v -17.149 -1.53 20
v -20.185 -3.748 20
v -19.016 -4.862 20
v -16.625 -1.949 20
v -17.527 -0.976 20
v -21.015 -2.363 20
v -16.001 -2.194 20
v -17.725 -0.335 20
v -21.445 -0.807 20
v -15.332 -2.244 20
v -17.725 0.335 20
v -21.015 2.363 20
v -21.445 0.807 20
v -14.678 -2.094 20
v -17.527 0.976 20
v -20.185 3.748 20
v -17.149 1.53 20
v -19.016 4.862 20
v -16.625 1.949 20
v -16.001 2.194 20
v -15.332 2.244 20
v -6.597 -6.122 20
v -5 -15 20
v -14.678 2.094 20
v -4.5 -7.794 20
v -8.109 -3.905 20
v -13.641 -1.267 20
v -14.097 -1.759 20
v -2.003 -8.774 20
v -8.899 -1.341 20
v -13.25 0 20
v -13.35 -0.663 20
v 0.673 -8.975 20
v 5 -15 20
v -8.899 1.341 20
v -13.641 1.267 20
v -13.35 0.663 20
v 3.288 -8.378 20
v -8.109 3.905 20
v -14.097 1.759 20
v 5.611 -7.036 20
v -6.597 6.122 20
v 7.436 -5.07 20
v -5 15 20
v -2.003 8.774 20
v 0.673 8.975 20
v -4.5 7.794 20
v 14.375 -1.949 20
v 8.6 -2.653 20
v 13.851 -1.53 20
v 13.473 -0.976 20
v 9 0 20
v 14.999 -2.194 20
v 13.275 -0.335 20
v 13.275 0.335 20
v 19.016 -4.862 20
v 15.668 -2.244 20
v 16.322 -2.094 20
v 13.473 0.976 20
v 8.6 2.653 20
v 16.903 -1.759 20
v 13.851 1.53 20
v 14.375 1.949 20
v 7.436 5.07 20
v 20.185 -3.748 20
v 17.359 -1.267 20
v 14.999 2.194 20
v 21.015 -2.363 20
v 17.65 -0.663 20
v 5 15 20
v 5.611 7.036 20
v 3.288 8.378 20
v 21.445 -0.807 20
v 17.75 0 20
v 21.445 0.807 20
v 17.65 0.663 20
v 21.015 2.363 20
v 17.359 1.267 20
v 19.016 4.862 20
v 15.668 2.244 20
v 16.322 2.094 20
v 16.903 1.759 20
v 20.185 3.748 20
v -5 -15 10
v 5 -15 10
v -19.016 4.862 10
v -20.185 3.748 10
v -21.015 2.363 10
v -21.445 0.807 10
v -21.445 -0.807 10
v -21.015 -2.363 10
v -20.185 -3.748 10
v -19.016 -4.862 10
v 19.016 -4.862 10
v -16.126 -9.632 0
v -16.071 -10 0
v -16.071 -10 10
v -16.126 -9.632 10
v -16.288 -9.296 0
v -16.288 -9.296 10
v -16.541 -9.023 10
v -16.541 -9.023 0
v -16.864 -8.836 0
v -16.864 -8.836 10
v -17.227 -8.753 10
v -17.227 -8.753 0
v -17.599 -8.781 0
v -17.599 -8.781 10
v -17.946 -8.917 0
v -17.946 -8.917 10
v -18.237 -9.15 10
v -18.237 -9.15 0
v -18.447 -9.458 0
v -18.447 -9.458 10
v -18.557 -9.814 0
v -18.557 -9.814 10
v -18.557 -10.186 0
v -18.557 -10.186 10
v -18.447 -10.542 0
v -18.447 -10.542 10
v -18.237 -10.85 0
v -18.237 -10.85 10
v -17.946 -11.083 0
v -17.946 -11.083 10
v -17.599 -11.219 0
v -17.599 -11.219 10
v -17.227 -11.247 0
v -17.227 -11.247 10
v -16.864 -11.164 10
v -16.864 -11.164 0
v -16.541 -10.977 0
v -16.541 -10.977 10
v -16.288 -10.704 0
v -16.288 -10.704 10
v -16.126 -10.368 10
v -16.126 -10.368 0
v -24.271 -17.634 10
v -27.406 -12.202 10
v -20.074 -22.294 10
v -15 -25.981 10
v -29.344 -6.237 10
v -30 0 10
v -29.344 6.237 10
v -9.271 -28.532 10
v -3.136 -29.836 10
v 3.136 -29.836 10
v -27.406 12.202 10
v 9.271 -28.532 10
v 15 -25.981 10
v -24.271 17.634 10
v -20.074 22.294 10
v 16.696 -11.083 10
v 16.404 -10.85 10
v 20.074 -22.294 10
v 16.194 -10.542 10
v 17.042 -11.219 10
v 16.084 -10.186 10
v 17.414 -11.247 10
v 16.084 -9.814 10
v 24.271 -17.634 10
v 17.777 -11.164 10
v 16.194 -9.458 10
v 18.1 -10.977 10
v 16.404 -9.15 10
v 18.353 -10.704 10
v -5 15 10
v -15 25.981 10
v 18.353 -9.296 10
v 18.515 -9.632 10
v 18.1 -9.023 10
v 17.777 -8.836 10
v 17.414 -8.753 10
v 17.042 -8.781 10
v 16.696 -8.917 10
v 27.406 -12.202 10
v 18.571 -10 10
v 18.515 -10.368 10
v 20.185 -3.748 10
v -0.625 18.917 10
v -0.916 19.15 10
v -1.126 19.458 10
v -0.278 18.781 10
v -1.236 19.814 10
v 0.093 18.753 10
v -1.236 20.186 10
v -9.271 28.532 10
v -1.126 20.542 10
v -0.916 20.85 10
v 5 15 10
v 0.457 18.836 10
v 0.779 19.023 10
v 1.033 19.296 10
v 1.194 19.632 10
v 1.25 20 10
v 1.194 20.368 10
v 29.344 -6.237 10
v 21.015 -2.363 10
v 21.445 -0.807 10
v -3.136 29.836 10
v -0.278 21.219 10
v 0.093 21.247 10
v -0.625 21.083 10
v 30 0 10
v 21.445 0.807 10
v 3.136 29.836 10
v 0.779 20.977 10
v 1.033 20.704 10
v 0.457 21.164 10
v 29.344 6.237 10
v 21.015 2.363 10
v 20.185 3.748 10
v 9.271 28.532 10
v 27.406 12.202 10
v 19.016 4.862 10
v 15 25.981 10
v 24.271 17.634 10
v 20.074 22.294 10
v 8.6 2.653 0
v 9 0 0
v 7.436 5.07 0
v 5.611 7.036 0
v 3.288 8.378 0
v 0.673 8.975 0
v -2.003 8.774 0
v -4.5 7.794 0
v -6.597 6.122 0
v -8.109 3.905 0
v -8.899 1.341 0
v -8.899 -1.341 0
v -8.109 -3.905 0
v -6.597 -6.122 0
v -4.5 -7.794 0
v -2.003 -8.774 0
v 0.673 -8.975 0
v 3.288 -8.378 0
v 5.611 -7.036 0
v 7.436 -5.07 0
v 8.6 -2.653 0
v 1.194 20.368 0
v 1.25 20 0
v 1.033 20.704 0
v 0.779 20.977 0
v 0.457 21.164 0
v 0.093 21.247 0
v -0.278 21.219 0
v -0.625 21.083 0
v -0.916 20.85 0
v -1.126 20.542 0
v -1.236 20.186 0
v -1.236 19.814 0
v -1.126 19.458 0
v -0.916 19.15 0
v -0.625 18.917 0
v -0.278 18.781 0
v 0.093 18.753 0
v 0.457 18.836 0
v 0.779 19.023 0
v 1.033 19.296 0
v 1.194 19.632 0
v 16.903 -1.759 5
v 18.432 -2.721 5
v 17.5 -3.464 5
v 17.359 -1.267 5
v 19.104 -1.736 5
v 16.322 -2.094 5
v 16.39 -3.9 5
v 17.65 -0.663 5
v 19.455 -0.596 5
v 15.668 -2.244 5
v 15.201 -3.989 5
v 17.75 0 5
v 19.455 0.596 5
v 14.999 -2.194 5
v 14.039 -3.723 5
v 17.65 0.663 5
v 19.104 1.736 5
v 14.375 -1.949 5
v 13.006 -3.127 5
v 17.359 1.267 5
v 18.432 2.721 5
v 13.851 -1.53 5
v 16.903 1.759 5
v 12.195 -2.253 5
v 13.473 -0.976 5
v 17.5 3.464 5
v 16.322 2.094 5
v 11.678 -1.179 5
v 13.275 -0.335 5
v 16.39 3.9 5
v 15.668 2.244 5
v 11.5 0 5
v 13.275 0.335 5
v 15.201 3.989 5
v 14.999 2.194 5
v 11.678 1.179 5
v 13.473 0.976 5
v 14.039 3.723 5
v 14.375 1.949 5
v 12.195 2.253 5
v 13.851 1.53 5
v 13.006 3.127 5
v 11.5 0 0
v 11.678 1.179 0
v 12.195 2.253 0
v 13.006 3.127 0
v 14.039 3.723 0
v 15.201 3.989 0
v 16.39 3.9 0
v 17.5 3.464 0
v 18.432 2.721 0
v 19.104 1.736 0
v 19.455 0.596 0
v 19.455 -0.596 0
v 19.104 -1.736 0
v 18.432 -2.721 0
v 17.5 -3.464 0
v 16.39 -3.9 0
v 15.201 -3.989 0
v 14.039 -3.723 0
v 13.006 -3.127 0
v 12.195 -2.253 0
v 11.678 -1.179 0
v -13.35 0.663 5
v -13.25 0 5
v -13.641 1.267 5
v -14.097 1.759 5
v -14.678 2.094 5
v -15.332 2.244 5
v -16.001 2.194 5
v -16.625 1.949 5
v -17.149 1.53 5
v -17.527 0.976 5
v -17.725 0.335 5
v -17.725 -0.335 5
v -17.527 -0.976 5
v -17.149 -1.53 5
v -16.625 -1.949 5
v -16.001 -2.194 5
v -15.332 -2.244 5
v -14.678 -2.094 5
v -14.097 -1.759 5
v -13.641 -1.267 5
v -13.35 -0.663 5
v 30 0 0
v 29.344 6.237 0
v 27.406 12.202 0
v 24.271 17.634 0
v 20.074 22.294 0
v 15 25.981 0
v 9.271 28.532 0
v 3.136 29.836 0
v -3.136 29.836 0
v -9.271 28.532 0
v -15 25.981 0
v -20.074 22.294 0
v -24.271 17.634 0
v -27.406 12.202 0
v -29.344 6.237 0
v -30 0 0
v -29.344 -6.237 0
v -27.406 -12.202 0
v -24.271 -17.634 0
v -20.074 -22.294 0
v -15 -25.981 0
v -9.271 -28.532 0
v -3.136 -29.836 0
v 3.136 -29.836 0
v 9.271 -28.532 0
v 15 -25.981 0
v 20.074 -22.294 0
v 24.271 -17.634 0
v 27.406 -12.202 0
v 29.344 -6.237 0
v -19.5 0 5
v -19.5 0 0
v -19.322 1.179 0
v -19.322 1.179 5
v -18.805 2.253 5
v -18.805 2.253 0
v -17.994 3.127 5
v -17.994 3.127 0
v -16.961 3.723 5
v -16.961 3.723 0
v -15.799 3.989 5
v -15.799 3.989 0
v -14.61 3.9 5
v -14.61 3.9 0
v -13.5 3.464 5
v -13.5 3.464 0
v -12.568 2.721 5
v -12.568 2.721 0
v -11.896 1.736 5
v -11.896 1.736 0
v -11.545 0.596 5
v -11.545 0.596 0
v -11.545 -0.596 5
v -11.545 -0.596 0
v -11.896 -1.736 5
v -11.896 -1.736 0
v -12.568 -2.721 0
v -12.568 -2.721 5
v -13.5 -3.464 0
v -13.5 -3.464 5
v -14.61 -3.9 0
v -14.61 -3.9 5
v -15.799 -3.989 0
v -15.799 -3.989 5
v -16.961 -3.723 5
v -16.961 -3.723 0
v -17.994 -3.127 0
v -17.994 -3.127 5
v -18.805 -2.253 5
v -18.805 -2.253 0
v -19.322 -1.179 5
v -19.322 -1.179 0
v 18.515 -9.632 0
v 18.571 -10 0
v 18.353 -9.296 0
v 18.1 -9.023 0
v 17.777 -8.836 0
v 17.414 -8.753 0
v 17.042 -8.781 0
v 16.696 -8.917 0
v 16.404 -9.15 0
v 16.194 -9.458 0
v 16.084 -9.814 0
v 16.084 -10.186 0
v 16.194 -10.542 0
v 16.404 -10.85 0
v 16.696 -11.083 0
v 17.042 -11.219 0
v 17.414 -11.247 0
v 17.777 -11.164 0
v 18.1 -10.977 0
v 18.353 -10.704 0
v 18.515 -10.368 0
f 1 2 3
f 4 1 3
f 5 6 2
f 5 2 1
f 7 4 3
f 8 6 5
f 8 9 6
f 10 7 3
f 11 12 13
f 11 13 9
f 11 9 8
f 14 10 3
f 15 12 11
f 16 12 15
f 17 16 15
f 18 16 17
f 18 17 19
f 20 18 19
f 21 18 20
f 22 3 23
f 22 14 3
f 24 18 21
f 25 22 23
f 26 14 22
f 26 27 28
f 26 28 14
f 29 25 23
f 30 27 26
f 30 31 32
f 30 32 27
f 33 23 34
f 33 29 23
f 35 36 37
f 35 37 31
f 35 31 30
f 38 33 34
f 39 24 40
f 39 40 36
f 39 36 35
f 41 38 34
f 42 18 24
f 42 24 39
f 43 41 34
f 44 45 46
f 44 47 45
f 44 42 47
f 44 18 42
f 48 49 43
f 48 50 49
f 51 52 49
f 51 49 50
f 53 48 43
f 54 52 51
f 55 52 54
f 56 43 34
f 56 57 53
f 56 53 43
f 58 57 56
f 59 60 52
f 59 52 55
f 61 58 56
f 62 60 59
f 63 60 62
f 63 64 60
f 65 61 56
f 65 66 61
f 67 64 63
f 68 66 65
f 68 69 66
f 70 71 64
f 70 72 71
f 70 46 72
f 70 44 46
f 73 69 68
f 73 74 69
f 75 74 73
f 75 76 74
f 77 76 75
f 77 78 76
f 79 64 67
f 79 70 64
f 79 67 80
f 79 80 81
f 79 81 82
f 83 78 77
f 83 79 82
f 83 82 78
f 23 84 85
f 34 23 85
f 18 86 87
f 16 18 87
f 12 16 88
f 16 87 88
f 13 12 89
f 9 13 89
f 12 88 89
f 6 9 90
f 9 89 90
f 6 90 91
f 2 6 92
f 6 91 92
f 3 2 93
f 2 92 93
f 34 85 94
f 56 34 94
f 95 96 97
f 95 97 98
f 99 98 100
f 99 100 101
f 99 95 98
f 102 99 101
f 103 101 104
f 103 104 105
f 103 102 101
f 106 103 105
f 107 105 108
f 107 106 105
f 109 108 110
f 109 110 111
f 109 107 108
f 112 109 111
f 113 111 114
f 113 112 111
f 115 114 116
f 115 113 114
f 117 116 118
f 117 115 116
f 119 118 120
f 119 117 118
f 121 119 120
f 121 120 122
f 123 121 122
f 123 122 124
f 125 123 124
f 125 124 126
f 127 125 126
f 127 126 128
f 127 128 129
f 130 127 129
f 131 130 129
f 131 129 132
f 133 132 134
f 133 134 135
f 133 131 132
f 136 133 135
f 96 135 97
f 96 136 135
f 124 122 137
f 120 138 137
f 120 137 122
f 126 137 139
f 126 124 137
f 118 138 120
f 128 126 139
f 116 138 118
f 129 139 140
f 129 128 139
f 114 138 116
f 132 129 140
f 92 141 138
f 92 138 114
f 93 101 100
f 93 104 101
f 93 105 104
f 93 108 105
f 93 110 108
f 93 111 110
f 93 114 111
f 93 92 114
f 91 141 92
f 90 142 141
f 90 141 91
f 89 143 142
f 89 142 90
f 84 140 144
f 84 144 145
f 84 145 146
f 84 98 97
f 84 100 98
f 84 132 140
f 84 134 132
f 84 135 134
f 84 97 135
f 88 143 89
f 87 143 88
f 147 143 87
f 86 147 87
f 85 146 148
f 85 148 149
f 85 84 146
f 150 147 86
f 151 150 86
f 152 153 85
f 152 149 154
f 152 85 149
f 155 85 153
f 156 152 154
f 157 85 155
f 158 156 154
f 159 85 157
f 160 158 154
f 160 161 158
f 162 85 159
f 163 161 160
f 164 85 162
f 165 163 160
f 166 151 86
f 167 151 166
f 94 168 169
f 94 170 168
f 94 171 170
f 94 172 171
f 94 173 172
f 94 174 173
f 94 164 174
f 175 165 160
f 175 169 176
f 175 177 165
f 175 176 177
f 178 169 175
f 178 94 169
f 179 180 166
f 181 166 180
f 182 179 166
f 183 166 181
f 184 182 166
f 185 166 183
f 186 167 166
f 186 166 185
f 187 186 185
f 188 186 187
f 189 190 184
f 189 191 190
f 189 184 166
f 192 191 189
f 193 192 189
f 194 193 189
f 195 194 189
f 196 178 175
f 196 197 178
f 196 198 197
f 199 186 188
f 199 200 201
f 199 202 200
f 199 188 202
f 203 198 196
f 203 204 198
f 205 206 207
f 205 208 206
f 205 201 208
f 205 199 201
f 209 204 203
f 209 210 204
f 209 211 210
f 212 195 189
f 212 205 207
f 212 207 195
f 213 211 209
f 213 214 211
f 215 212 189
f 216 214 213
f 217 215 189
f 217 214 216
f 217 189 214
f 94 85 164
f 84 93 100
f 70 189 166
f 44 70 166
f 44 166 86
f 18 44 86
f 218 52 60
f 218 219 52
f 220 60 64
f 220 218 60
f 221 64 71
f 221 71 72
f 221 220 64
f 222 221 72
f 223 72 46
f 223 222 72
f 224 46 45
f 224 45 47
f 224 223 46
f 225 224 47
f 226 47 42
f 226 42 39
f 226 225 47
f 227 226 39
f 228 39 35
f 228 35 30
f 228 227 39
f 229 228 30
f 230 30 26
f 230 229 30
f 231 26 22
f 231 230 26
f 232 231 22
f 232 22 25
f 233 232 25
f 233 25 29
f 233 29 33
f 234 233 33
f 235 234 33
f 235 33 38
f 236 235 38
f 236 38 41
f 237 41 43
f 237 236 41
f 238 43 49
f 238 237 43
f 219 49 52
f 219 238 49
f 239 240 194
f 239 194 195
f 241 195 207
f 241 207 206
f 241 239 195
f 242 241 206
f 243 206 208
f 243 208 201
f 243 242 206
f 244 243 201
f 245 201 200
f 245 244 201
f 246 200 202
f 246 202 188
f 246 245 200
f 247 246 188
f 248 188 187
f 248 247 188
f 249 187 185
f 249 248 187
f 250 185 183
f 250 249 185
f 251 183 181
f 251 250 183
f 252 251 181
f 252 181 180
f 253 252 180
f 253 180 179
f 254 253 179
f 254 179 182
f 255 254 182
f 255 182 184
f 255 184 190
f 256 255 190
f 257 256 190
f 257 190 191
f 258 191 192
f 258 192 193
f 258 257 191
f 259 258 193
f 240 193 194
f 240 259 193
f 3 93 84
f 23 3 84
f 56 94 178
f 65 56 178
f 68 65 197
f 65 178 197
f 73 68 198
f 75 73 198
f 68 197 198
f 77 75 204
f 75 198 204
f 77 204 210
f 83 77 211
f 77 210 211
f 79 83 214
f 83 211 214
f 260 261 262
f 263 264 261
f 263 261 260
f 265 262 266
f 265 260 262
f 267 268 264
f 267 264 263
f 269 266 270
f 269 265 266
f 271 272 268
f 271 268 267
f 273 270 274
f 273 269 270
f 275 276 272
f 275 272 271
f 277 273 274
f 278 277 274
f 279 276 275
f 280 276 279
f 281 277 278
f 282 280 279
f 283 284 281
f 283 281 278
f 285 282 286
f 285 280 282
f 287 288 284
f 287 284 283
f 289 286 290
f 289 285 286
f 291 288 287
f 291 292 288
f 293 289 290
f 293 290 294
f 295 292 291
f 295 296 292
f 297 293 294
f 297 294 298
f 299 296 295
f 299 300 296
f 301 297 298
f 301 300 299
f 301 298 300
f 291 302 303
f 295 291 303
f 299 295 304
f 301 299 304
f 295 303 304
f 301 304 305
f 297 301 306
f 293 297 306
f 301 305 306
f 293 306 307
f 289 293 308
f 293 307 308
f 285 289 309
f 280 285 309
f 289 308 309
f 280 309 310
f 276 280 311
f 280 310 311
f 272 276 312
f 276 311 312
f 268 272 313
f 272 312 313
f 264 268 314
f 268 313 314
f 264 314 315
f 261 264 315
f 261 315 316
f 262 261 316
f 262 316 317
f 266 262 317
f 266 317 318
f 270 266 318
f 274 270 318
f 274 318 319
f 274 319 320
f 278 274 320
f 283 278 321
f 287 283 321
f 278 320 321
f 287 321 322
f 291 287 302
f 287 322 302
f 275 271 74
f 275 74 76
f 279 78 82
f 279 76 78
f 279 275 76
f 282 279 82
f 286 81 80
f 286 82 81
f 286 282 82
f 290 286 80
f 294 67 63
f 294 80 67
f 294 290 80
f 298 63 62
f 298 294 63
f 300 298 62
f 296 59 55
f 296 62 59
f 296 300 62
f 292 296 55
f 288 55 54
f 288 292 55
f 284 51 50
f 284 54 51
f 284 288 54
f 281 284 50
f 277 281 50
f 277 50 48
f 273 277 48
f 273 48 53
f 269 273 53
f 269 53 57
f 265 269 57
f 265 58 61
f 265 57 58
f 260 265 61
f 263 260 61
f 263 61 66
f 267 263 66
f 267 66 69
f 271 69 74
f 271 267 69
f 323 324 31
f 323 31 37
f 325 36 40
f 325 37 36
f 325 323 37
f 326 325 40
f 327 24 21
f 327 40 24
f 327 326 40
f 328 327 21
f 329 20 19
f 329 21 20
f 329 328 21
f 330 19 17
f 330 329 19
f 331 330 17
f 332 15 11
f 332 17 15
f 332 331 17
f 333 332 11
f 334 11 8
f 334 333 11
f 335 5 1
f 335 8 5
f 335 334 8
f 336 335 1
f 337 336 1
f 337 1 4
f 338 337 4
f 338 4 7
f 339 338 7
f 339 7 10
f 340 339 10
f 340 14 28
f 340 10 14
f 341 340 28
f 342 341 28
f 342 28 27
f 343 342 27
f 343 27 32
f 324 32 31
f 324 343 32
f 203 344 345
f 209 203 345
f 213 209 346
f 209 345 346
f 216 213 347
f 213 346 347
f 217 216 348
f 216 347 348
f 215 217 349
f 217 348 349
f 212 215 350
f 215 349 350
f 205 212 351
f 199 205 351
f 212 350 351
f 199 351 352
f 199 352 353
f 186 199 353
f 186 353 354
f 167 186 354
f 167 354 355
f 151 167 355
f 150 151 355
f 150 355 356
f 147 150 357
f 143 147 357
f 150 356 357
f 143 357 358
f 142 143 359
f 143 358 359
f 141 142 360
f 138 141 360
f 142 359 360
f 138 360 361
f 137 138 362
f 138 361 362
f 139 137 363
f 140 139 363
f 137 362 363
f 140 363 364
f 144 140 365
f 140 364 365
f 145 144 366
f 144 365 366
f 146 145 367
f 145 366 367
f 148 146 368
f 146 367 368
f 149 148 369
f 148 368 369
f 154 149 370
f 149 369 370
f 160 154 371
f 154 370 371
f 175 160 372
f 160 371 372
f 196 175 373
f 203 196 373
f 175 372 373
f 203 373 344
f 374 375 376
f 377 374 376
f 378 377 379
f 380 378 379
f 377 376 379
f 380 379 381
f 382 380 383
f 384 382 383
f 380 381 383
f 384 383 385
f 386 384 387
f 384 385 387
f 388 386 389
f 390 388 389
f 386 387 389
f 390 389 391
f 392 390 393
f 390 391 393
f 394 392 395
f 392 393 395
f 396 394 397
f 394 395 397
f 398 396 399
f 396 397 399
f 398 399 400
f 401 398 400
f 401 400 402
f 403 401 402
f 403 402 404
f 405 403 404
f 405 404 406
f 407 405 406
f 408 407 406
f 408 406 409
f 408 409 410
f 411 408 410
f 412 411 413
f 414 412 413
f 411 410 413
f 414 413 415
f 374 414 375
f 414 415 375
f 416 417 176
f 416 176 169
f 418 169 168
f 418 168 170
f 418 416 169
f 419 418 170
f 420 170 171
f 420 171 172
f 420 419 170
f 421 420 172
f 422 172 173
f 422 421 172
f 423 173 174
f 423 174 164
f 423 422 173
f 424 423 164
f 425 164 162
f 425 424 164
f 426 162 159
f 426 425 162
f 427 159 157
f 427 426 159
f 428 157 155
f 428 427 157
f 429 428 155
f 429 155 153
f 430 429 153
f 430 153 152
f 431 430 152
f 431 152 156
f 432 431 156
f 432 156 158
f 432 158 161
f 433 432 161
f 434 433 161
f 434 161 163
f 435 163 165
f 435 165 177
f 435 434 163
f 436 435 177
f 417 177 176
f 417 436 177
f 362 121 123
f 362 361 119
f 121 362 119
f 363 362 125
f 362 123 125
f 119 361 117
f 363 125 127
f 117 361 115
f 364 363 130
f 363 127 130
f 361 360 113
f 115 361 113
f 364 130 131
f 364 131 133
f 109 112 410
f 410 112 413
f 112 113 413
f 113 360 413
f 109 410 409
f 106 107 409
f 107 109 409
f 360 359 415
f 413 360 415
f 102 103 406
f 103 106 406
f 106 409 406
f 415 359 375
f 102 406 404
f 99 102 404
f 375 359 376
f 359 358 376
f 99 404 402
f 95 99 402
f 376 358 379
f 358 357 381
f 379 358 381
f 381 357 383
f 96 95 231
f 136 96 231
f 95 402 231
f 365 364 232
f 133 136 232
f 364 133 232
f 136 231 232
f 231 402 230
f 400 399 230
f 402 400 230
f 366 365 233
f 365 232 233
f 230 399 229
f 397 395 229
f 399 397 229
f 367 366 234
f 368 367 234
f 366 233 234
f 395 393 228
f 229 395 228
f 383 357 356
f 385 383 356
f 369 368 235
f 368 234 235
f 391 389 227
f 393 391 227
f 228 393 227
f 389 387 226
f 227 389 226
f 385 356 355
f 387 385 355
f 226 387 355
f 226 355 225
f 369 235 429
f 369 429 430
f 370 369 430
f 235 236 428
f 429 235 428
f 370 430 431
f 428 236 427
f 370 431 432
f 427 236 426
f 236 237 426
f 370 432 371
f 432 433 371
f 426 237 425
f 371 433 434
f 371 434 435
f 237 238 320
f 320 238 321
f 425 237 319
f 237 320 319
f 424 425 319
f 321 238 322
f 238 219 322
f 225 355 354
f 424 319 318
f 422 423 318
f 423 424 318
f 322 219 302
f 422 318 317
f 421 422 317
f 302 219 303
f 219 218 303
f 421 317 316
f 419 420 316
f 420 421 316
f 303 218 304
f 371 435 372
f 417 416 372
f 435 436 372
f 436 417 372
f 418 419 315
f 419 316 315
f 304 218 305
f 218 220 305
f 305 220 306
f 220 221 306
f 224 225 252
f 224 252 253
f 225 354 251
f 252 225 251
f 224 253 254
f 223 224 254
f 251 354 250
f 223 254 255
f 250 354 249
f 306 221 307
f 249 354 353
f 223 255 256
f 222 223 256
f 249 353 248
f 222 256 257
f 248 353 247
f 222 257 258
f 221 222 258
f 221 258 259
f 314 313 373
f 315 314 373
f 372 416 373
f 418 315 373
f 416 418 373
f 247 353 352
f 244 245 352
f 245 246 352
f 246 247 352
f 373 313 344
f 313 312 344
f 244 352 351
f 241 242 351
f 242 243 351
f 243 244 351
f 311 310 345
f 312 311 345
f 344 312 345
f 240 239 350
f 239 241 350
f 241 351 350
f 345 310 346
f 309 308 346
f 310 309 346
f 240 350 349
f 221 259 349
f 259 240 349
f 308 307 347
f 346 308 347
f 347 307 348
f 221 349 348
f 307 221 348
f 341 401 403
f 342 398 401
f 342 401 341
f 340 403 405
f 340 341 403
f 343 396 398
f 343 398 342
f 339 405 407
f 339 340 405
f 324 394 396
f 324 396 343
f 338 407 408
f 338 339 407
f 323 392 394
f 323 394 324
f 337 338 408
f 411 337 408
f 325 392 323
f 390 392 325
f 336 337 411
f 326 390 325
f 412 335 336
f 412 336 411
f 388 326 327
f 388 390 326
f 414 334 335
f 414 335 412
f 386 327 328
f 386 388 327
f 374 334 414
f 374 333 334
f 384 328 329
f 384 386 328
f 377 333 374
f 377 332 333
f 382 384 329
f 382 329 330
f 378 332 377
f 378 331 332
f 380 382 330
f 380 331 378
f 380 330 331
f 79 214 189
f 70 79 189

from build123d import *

# Parameters (mm, degrees)
SKETCH_1_R               = 30
SKETCH_1_R_2             = 9
SKETCH_1_R_3             = 1.25
EXTRUDE_1_DEPTH          = 10
SKETCH_3_R               = 9
EXTRUDE_2_DEPTH          = 10
CUT_EXTRUDE_1_DEPTH      = 44.588989435
CUT_EXTRUDE_1_DEPTH_BACK = 44.588989435
SKETCH_2_R               = 2.25
SKETCH_4_R               = 4
CUT_EXTRUDE_2_DEPTH      = 5


with BuildPart() as part:
    # 草图1 → 凸台-拉伸1 (new body)
    with BuildSketch(Plane.XY):
        Circle(SKETCH_1_R)
        Circle(SKETCH_1_R_2, mode=Mode.SUBTRACT)
        with Locations((0, 20)):
            Circle(SKETCH_1_R_3, mode=Mode.SUBTRACT)
        with Locations((17.320508076, -10)):
            Circle(SKETCH_1_R_3, mode=Mode.SUBTRACT)
        with Locations((-17.320508076, -10)):
            Circle(SKETCH_1_R_3, mode=Mode.SUBTRACT)
    extrude(amount=EXTRUDE_1_DEPTH)

    # 草图3 → 凸台-拉伸2 (add)
    with BuildSketch(Plane.XY.offset(10)):
        with BuildLine():
            Line((5, 15), (-5, 15))
            Line((-5, 15), (-19.016468159, 4.861527711))
            ThreePointArc((-19.016468159, 4.861527711), (-21.5, 0), (-19.016468159, -4.861527711))
            Line((-19.016468159, -4.861527711), (-5, -15))
            Line((-5, -15), (5, -15))
            Line((5, -15), (19.016468159, -4.861527711))
            ThreePointArc((19.016468159, -4.861527711), (21.5, 0), (19.016468159, 4.861527711))
            Line((19.016468159, 4.861527711), (5, 15))
        make_face()
        Circle(SKETCH_3_R, mode=Mode.SUBTRACT)
    extrude(amount=EXTRUDE_2_DEPTH)

    # 草图2 → 切除-拉伸1 (cut, two sides: drawn at the far end of the back side and taken through both)
    with BuildSketch(Plane.XY.offset(10).offset(-CUT_EXTRUDE_1_DEPTH_BACK)):
        with Locations((-15.5, 0)):
            Circle(SKETCH_2_R)
        with Locations((15.5, 0)):
            Circle(SKETCH_2_R)
    extrude(amount=CUT_EXTRUDE_1_DEPTH + CUT_EXTRUDE_1_DEPTH_BACK, mode=Mode.SUBTRACT)

    # 草图4 → 切除-拉伸2 (cut)
    with BuildSketch(Plane(origin=(0, 0, 0), x_dir=(-1, 0, 0), z_dir=(0, 0, -1))):
        with Locations((-15.5, 0)):
            Circle(SKETCH_4_R)
        with Locations((15.5, 0)):
            Circle(SKETCH_4_R)
    extrude(amount=-CUT_EXTRUDE_2_DEPTH, mode=Mode.SUBTRACT)


solid = part.part
